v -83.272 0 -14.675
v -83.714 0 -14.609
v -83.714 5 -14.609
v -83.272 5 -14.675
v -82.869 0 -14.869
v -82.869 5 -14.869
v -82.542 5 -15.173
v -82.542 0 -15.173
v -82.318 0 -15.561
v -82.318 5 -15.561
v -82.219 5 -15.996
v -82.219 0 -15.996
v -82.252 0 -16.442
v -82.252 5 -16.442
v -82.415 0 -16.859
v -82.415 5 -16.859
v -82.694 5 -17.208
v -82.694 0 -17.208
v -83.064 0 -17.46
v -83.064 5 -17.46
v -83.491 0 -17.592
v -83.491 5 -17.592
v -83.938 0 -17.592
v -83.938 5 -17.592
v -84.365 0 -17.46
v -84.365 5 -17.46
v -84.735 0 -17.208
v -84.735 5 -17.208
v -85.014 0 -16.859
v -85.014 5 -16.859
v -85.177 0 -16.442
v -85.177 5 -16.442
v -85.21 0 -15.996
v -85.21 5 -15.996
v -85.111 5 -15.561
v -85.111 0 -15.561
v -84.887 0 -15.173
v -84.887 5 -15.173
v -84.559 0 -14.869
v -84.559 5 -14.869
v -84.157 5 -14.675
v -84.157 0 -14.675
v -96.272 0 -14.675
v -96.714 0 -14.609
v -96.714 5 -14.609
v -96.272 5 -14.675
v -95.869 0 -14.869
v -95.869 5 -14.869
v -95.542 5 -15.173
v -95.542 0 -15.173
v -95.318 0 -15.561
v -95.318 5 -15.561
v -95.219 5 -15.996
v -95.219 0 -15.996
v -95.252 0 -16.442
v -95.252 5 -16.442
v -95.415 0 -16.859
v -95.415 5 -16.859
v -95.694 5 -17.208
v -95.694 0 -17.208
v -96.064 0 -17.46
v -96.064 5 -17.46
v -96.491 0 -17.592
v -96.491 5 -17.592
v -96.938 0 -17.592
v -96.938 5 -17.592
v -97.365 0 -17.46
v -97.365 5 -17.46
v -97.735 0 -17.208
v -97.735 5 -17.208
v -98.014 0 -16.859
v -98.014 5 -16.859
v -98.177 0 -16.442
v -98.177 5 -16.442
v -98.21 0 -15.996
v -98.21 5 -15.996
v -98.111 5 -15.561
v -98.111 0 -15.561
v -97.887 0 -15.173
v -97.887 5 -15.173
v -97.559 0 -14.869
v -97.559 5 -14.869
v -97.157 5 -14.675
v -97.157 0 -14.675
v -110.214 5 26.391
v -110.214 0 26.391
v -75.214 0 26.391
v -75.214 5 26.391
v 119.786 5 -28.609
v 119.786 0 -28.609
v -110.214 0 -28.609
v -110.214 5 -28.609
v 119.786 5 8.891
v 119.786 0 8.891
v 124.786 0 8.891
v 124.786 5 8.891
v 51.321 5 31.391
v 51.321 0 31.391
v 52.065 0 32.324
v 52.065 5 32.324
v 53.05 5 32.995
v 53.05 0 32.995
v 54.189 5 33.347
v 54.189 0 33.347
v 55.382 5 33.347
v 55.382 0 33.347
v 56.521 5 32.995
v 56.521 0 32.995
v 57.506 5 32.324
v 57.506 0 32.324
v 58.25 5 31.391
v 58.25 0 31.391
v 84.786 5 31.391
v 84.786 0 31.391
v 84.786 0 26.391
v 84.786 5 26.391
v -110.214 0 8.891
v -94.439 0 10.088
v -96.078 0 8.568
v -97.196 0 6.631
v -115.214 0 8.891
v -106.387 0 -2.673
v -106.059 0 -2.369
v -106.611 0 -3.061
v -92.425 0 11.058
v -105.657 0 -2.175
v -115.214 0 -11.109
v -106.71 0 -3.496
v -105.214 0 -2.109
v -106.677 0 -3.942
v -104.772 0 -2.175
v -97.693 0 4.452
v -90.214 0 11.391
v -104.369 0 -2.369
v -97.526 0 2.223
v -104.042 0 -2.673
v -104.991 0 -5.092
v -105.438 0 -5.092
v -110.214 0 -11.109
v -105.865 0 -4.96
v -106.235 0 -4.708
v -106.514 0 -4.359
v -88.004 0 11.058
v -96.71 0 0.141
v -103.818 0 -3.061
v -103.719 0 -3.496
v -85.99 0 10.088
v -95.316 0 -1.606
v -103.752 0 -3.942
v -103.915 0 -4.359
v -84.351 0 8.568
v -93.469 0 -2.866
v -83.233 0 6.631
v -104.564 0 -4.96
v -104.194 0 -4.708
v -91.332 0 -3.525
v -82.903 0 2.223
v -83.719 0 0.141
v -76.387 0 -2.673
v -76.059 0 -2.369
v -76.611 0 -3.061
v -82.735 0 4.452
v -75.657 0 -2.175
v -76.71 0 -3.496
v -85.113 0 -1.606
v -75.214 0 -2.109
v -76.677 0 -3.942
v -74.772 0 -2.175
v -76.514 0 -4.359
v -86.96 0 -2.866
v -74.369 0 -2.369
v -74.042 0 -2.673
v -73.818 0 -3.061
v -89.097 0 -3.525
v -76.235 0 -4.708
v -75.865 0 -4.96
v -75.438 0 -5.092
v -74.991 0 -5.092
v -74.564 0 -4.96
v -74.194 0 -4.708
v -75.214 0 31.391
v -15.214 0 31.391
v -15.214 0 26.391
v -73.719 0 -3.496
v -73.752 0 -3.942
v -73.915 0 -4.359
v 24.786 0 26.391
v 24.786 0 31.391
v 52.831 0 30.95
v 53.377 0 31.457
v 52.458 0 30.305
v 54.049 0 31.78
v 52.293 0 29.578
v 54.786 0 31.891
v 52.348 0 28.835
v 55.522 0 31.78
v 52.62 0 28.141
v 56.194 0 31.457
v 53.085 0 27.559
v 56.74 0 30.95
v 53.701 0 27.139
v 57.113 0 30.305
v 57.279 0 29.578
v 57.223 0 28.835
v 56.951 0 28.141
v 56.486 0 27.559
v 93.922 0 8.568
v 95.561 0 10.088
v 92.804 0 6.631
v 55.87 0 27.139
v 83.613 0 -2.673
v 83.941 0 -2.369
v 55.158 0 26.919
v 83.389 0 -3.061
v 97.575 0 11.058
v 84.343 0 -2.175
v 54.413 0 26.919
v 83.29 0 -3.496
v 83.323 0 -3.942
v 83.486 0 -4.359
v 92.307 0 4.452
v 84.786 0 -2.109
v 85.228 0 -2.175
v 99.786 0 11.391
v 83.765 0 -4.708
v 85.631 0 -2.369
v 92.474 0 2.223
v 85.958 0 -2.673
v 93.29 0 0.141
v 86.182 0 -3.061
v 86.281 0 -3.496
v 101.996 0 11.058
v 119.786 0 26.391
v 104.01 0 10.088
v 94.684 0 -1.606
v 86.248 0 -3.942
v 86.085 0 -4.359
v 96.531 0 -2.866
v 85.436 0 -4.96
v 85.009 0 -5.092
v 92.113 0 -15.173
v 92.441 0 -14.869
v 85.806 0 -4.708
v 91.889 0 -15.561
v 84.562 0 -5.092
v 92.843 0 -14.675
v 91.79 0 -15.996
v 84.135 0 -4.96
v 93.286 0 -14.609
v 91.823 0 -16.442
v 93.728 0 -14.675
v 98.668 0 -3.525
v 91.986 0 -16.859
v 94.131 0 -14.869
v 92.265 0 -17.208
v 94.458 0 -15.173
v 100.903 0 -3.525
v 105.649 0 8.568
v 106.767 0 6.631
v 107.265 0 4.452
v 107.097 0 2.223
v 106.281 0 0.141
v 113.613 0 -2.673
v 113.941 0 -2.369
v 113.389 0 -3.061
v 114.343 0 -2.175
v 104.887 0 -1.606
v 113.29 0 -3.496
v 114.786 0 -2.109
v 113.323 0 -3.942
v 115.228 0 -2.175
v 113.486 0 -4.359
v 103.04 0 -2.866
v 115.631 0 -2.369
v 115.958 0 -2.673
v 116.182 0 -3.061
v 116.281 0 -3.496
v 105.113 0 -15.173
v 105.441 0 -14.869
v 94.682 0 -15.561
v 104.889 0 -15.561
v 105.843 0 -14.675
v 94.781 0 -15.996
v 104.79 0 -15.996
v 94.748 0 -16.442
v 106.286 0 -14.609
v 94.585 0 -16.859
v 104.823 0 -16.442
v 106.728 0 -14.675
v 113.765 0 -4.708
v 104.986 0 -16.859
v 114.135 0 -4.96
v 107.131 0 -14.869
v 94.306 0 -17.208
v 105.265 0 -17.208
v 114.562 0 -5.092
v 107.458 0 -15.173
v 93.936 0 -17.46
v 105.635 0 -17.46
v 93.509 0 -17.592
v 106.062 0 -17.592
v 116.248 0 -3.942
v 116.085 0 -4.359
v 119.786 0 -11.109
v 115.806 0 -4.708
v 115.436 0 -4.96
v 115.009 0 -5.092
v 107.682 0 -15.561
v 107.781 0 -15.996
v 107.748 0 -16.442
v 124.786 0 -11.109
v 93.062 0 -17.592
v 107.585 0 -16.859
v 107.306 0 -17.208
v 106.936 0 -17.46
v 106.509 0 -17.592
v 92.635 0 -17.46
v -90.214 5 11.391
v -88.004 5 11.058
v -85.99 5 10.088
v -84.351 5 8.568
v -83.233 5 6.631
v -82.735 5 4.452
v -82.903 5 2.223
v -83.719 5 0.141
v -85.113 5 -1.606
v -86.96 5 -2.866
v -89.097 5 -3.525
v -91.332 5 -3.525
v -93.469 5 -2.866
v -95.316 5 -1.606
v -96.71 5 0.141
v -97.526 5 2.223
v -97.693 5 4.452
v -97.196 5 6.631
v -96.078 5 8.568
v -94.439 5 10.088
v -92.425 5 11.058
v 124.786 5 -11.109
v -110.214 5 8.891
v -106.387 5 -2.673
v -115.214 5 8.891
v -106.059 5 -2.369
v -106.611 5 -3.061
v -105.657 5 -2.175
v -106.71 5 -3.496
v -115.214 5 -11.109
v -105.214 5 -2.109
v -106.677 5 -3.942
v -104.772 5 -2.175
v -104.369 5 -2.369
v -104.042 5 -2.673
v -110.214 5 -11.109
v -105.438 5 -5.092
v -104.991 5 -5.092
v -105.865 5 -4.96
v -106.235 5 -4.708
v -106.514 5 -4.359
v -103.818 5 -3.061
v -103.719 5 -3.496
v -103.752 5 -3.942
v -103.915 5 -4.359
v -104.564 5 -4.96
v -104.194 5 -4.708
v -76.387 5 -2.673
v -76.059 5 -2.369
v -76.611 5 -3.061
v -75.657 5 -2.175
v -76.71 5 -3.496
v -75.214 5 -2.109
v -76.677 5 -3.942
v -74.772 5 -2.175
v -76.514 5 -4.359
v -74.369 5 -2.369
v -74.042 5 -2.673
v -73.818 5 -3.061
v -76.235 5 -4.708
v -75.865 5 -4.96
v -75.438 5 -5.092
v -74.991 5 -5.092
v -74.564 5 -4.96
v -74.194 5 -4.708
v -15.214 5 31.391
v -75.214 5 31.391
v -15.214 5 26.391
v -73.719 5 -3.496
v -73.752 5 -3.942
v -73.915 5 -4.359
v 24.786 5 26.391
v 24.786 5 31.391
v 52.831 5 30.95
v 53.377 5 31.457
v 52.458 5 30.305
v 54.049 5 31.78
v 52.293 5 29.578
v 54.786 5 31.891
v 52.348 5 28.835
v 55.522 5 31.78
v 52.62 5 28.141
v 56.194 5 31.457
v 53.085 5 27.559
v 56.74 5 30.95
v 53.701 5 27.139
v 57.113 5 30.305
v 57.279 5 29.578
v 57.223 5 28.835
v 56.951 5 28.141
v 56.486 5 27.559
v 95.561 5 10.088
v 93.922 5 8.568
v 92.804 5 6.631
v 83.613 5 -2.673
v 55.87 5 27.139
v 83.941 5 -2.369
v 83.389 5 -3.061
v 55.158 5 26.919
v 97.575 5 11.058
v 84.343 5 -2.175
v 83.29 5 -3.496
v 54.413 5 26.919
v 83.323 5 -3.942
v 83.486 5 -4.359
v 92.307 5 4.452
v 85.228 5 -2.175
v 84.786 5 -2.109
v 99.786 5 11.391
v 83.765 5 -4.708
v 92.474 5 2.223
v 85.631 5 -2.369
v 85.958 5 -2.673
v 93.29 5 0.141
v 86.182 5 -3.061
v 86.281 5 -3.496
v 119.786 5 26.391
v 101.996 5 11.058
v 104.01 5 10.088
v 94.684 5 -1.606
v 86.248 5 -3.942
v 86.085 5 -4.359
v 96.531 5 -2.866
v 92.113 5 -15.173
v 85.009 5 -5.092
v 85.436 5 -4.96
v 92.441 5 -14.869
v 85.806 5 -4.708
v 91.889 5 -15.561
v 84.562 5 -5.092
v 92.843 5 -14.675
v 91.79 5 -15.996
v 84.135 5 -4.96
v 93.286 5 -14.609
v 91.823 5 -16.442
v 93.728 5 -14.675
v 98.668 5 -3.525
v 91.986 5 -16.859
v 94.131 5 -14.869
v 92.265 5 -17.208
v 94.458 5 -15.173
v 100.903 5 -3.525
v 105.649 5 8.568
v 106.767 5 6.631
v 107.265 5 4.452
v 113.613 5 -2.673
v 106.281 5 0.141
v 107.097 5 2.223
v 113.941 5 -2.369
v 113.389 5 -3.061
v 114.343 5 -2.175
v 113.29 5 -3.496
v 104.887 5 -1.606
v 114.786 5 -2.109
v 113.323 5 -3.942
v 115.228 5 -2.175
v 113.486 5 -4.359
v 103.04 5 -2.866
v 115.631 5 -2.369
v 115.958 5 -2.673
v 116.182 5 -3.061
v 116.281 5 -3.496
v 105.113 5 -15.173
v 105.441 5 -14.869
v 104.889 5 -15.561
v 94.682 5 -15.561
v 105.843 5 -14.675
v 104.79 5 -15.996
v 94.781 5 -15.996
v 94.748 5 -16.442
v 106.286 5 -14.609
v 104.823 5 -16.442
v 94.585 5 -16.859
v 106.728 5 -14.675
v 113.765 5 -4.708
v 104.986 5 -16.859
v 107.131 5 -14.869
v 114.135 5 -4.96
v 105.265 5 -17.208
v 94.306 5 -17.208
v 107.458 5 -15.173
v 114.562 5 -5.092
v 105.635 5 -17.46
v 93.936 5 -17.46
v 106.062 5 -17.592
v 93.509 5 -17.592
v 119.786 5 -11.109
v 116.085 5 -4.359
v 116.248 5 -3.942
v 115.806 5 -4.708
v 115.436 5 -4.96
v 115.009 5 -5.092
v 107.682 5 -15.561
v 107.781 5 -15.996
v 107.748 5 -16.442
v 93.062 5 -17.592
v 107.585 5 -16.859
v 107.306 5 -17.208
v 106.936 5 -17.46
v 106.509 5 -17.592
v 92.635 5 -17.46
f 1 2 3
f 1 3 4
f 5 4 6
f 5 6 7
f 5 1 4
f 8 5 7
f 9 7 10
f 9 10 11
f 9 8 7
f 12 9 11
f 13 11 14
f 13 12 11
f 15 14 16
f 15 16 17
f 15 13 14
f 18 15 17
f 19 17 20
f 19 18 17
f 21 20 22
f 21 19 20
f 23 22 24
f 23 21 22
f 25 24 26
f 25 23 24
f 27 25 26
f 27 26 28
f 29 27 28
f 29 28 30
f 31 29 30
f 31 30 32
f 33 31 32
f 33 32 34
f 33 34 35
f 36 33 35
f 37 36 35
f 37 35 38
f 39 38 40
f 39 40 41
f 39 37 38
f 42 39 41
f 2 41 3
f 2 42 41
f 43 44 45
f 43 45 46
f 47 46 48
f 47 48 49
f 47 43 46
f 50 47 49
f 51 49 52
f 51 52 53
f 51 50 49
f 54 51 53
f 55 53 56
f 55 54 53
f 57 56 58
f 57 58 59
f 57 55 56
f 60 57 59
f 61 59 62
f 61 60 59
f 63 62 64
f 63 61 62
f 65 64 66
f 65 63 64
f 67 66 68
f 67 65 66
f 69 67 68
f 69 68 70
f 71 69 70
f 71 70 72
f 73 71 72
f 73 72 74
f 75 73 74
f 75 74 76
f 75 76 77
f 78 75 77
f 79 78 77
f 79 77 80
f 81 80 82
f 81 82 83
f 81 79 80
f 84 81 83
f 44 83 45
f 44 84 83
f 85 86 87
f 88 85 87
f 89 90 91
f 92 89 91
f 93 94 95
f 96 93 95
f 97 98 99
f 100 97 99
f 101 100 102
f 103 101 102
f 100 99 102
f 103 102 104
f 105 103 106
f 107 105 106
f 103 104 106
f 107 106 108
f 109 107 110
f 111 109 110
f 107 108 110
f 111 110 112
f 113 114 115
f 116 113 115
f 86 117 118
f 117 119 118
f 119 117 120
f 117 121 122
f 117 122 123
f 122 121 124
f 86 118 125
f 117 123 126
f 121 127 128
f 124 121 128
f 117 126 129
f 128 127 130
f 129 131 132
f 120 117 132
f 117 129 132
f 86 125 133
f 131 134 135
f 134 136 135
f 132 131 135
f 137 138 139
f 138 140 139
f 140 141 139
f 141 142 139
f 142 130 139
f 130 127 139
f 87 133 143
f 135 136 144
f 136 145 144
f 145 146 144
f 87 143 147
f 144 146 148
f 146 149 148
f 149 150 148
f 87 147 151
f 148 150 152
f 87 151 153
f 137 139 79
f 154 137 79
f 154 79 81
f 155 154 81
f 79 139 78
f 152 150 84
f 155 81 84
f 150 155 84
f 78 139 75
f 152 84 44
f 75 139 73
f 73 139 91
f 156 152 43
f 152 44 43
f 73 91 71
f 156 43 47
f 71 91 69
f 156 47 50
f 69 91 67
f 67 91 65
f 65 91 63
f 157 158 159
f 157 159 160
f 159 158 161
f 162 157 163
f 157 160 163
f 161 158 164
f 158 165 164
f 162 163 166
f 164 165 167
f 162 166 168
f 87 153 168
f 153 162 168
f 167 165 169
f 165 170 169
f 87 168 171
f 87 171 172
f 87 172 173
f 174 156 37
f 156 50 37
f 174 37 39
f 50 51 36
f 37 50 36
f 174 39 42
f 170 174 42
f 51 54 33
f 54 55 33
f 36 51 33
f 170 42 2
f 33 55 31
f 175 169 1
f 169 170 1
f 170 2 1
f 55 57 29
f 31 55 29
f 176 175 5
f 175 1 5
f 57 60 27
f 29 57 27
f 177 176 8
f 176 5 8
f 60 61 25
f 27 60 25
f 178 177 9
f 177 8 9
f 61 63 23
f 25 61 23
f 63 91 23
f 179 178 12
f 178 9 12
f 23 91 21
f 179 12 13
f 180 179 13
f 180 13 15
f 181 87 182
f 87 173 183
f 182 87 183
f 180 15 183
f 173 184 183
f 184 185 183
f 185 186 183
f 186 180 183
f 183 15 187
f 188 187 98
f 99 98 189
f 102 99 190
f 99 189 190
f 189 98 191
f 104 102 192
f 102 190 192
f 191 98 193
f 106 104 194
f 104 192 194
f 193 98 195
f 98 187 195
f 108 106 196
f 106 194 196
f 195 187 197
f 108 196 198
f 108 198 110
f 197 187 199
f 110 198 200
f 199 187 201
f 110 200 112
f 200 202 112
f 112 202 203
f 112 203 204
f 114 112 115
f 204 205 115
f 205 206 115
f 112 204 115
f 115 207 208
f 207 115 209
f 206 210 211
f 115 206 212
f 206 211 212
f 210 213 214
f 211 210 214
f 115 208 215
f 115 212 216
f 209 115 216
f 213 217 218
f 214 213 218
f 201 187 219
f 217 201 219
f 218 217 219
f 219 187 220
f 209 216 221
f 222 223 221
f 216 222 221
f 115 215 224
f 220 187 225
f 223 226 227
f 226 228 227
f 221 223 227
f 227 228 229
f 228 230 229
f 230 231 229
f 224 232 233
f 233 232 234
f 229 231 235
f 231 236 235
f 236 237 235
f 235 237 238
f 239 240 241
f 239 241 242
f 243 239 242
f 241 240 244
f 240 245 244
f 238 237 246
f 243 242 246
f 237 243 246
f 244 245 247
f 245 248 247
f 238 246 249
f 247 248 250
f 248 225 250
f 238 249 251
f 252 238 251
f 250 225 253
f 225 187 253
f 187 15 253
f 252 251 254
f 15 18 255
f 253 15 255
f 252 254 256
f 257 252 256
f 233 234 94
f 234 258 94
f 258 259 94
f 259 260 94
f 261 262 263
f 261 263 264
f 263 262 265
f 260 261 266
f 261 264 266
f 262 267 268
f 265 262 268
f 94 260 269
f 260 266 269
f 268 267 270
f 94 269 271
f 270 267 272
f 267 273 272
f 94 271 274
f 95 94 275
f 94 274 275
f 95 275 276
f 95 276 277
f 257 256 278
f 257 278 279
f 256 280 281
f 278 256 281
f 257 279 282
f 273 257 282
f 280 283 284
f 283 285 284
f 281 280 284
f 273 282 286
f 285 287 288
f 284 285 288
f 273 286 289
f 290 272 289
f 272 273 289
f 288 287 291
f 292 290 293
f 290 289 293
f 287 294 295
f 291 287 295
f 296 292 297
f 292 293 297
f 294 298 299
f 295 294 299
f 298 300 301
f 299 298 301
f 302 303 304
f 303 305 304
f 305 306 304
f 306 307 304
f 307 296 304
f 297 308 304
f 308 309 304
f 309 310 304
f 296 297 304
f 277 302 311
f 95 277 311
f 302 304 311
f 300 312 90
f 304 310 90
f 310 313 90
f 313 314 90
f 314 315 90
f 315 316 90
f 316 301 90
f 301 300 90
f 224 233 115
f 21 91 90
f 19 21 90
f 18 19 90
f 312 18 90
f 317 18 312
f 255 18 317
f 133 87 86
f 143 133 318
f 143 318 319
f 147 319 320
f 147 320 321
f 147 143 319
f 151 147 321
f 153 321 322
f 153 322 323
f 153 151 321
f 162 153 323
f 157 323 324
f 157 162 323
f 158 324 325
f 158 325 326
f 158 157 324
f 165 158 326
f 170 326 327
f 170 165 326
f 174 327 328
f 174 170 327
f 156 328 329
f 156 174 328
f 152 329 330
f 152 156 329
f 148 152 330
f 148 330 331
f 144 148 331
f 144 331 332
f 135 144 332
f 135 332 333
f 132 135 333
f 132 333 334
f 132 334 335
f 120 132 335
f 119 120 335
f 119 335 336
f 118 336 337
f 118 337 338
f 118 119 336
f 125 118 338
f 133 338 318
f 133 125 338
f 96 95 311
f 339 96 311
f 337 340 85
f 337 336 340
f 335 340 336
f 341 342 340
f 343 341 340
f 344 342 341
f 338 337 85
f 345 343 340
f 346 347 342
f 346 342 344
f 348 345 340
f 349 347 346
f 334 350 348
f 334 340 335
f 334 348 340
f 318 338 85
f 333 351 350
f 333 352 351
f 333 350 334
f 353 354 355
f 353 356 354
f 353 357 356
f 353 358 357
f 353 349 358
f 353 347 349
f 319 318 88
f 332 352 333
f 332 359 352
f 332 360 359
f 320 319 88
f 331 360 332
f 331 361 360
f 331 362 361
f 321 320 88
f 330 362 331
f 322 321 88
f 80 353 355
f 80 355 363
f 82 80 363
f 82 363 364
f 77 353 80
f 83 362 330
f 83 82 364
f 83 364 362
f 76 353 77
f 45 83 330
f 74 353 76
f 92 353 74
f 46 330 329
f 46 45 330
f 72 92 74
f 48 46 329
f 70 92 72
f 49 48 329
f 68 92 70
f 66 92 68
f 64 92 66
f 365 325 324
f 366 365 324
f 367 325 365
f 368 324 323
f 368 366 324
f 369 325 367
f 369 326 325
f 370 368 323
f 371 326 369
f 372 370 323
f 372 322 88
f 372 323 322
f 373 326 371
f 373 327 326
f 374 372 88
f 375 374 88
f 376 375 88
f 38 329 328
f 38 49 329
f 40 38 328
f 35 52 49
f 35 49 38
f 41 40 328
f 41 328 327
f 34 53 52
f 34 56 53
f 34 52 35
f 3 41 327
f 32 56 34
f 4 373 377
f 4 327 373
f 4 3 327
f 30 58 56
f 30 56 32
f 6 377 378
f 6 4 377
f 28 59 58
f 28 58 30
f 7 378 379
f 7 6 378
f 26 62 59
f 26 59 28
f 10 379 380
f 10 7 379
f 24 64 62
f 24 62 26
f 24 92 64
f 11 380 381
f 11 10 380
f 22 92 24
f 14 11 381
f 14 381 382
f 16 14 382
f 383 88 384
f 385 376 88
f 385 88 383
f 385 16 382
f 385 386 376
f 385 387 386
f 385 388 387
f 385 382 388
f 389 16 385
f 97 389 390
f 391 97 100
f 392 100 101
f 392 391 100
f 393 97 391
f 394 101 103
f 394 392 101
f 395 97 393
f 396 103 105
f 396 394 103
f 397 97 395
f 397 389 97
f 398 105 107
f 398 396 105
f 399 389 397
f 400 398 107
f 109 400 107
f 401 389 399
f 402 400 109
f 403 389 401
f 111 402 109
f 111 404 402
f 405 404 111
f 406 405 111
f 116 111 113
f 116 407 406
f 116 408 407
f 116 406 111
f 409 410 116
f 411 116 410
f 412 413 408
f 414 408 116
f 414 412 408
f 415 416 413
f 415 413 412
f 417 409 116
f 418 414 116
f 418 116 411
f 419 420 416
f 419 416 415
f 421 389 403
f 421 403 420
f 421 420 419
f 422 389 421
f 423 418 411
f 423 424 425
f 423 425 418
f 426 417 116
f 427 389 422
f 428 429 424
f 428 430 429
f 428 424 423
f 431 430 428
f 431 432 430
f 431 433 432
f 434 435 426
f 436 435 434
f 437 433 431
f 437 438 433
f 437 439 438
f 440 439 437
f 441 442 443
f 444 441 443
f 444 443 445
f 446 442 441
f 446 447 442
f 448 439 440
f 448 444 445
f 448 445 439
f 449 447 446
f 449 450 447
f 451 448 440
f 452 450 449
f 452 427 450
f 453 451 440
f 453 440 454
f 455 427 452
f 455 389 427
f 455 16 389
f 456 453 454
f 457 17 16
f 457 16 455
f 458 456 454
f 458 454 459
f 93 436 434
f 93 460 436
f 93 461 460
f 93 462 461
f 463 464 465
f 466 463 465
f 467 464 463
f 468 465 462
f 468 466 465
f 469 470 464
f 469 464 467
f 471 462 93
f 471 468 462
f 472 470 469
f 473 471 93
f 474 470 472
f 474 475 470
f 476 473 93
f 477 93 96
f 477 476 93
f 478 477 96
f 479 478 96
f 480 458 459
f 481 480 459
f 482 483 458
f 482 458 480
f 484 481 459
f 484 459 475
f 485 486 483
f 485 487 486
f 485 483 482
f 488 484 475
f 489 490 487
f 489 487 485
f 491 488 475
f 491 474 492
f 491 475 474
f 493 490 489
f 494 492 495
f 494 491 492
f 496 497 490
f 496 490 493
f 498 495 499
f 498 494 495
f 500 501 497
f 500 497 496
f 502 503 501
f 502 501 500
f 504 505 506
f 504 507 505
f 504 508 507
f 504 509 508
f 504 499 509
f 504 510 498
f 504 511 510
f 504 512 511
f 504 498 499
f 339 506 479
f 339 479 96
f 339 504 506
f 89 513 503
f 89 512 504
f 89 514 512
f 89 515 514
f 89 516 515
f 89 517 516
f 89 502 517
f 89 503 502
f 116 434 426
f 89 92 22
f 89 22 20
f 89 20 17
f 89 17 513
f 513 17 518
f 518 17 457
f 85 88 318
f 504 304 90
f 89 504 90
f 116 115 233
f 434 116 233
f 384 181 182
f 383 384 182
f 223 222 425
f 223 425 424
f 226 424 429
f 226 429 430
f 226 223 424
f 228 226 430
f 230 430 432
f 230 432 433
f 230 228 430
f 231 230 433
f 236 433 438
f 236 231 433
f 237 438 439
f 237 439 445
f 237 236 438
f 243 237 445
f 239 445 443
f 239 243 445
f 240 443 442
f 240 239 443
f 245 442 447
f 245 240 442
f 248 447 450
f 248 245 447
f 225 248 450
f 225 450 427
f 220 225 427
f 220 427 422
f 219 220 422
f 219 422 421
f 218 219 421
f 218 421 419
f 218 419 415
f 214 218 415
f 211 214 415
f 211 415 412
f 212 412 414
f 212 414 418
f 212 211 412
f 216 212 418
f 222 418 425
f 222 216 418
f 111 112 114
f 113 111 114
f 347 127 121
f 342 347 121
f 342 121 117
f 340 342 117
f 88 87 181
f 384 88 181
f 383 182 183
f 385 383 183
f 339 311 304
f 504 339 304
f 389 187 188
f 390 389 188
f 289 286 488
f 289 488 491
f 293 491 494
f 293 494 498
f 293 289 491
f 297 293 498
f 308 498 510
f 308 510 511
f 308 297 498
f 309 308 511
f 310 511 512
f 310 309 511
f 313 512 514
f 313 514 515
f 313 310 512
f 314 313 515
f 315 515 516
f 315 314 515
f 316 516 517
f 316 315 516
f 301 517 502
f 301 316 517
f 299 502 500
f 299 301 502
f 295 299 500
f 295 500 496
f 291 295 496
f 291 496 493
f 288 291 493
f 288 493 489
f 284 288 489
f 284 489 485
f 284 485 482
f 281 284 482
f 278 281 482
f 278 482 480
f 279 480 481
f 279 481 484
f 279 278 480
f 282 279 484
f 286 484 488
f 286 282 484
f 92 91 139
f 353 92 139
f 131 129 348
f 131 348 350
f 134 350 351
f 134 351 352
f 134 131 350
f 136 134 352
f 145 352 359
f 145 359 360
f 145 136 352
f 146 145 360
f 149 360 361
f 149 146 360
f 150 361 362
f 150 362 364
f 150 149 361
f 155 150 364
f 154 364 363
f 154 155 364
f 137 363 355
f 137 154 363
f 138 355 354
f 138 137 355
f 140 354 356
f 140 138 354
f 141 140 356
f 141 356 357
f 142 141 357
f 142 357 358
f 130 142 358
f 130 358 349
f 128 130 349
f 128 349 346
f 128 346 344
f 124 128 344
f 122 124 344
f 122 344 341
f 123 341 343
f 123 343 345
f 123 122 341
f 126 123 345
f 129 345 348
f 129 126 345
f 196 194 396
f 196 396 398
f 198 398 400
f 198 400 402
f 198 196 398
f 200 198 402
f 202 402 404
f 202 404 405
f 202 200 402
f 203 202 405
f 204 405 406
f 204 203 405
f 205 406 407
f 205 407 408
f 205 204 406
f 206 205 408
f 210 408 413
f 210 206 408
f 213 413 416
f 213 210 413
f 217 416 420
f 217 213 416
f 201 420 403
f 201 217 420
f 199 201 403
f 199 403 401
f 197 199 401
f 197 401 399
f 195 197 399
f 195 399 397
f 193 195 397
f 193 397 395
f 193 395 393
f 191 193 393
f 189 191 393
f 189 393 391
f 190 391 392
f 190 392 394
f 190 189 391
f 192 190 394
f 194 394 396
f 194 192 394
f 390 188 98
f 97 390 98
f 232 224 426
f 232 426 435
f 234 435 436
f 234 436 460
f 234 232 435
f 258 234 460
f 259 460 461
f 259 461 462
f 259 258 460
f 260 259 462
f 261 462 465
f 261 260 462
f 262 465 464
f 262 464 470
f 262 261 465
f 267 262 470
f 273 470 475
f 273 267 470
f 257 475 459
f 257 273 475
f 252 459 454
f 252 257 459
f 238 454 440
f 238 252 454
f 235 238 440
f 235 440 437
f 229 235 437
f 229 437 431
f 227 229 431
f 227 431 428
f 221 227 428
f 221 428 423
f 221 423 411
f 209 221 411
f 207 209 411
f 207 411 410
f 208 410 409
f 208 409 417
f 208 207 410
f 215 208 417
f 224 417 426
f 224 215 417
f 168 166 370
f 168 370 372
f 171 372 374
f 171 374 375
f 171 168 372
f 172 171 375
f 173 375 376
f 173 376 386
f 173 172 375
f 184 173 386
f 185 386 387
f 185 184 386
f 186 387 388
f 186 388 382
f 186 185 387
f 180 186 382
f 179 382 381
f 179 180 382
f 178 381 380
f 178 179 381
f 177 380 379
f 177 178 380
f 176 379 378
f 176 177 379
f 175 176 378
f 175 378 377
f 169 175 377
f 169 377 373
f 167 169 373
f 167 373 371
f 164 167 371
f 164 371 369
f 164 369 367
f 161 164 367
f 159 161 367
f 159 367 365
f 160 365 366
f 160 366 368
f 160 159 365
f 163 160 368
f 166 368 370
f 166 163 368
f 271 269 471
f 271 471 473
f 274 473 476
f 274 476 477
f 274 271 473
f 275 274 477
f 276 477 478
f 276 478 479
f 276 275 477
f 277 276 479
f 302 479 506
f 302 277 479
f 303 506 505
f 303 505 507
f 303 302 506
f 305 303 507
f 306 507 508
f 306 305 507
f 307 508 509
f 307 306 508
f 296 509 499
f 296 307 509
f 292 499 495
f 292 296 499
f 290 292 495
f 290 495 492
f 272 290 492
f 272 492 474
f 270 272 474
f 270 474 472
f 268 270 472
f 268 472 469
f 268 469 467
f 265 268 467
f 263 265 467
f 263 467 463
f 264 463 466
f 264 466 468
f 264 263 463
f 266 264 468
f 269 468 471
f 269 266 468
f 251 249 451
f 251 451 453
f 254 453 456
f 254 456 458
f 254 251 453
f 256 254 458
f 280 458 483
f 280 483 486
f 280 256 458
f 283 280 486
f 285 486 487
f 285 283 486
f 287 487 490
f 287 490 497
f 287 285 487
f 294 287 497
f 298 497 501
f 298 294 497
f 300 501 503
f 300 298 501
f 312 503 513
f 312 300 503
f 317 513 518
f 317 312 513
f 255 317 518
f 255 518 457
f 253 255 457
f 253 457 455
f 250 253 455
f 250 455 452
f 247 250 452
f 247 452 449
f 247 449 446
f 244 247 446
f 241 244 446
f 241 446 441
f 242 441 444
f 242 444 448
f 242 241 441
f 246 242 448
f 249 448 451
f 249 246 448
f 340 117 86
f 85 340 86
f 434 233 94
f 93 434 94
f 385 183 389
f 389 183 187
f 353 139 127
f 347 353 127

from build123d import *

# Parameters (mm, degrees)
ESQUISSE2_R        = 2.5
ESQUISSE2_R_2      = 7.5
ESQUISSE2_R_3      = 1.5
BOSS_EXTRU_5_DEPTH = 5


with BuildPart() as part:
    # Esquisse2 → Boss.-Extru.5 (new body)
    with BuildSketch(Plane(origin=(0, 0, 0), x_dir=(1, 0, 0), z_dir=(0, 1, 0))):
        with BuildLine():
            Line((-75.214465703, -26.391441925), (-75.214465703, -31.391441925))
            Line((-75.214465703, -31.391441925), (-15.214465703, -31.391441925))
            Line((-15.214465703, -31.391441925), (-15.214465703, -26.391441925))
            Line((-15.214465703, -26.391441925), (24.785534297, -26.391441925))
            Line((24.785534297, -26.391441925), (24.785534297, -31.391441925))
            Line((24.785534297, -31.391441925), (51.321432682, -31.391441925))
            ThreePointArc((51.321432682, -31.391441925), (54.785534297, -33.391441925), (58.249635912, -31.391441925))
            Line((58.249635912, -31.391441925), (84.785534297, -31.391441925))
            Line((84.785534297, -31.391441925), (84.785534297, -26.391441925))
            Line((84.785534297, -26.391441925), (119.785534297, -26.391441925))
            Line((119.785534297, -26.391441925), (119.785534297, -8.891441925))
            Line((119.785534297, -8.891441925), (124.785534297, -8.891441925))
            Line((124.785534297, -8.891441925), (124.785534297, 11.108558075))
            Line((124.785534297, 11.108558075), (119.785534297, 11.108558075))
            Line((119.785534297, 11.108558075), (119.785534297, 28.608558075))
            Line((119.785534297, 28.608558075), (-110.214465703, 28.608558075))
            Line((-110.214465703, 28.608558075), (-110.214465703, 11.108558075))
            Line((-110.214465703, 11.108558075), (-115.214465703, 11.108558075))
            Line((-115.214465703, 11.108558075), (-115.214465703, -8.891441925))
            Line((-115.214465703, -8.891441925), (-110.214465703, -8.891441925))
            Line((-110.214465703, -8.891441925), (-110.214465703, -26.391441925))
            Line((-110.214465703, -26.391441925), (-75.214465703, -26.391441925))
        make_face()
        with Locations(Location((54.785534297, -29.391441925, 0), (0, 0, 270))):
            Circle(ESQUISSE2_R, mode=Mode.SUBTRACT)
        with Locations(Location((-90.214465703, -3.891441925, 0), (0, 0, 270))):
            Circle(ESQUISSE2_R_2, mode=Mode.SUBTRACT)
        with Locations(Location((99.785534297, -3.891441925, 0), (0, 0, 270))):
            Circle(ESQUISSE2_R_2, mode=Mode.SUBTRACT)
        with Locations(Location((-105.214465703, 3.608558075, 0), (0, 0, 270))):
            Circle(ESQUISSE2_R_3, mode=Mode.SUBTRACT)
        with Locations(Location((-75.214465703, 3.608558075, 0), (0, 0, 270))):
            Circle(ESQUISSE2_R_3, mode=Mode.SUBTRACT)
        with Locations(Location((-96.714465703, 16.108558075, 0), (0, 0, 270))):
            Circle(ESQUISSE2_R_3, mode=Mode.SUBTRACT)
        with Locations(Location((-83.714465703, 16.108558075, 0), (0, 0, 270))):
            Circle(ESQUISSE2_R_3, mode=Mode.SUBTRACT)
        with Locations(Location((84.785534297, 3.608558075, 0), (0, 0, 270))):
            Circle(ESQUISSE2_R_3, mode=Mode.SUBTRACT)
        with Locations(Location((114.785534297, 3.608558075, 0), (0, 0, 270))):
            Circle(ESQUISSE2_R_3, mode=Mode.SUBTRACT)
        with Locations(Location((93.285534297, 16.108558075, 0), (0, 0, 270))):
            Circle(ESQUISSE2_R_3, mode=Mode.SUBTRACT)
        with Locations(Location((106.285534297, 16.108558075, 0), (0, 0, 270))):
            Circle(ESQUISSE2_R_3, mode=Mode.SUBTRACT)
    extrude(amount=BOSS_EXTRU_5_DEPTH)


solid = part.part
